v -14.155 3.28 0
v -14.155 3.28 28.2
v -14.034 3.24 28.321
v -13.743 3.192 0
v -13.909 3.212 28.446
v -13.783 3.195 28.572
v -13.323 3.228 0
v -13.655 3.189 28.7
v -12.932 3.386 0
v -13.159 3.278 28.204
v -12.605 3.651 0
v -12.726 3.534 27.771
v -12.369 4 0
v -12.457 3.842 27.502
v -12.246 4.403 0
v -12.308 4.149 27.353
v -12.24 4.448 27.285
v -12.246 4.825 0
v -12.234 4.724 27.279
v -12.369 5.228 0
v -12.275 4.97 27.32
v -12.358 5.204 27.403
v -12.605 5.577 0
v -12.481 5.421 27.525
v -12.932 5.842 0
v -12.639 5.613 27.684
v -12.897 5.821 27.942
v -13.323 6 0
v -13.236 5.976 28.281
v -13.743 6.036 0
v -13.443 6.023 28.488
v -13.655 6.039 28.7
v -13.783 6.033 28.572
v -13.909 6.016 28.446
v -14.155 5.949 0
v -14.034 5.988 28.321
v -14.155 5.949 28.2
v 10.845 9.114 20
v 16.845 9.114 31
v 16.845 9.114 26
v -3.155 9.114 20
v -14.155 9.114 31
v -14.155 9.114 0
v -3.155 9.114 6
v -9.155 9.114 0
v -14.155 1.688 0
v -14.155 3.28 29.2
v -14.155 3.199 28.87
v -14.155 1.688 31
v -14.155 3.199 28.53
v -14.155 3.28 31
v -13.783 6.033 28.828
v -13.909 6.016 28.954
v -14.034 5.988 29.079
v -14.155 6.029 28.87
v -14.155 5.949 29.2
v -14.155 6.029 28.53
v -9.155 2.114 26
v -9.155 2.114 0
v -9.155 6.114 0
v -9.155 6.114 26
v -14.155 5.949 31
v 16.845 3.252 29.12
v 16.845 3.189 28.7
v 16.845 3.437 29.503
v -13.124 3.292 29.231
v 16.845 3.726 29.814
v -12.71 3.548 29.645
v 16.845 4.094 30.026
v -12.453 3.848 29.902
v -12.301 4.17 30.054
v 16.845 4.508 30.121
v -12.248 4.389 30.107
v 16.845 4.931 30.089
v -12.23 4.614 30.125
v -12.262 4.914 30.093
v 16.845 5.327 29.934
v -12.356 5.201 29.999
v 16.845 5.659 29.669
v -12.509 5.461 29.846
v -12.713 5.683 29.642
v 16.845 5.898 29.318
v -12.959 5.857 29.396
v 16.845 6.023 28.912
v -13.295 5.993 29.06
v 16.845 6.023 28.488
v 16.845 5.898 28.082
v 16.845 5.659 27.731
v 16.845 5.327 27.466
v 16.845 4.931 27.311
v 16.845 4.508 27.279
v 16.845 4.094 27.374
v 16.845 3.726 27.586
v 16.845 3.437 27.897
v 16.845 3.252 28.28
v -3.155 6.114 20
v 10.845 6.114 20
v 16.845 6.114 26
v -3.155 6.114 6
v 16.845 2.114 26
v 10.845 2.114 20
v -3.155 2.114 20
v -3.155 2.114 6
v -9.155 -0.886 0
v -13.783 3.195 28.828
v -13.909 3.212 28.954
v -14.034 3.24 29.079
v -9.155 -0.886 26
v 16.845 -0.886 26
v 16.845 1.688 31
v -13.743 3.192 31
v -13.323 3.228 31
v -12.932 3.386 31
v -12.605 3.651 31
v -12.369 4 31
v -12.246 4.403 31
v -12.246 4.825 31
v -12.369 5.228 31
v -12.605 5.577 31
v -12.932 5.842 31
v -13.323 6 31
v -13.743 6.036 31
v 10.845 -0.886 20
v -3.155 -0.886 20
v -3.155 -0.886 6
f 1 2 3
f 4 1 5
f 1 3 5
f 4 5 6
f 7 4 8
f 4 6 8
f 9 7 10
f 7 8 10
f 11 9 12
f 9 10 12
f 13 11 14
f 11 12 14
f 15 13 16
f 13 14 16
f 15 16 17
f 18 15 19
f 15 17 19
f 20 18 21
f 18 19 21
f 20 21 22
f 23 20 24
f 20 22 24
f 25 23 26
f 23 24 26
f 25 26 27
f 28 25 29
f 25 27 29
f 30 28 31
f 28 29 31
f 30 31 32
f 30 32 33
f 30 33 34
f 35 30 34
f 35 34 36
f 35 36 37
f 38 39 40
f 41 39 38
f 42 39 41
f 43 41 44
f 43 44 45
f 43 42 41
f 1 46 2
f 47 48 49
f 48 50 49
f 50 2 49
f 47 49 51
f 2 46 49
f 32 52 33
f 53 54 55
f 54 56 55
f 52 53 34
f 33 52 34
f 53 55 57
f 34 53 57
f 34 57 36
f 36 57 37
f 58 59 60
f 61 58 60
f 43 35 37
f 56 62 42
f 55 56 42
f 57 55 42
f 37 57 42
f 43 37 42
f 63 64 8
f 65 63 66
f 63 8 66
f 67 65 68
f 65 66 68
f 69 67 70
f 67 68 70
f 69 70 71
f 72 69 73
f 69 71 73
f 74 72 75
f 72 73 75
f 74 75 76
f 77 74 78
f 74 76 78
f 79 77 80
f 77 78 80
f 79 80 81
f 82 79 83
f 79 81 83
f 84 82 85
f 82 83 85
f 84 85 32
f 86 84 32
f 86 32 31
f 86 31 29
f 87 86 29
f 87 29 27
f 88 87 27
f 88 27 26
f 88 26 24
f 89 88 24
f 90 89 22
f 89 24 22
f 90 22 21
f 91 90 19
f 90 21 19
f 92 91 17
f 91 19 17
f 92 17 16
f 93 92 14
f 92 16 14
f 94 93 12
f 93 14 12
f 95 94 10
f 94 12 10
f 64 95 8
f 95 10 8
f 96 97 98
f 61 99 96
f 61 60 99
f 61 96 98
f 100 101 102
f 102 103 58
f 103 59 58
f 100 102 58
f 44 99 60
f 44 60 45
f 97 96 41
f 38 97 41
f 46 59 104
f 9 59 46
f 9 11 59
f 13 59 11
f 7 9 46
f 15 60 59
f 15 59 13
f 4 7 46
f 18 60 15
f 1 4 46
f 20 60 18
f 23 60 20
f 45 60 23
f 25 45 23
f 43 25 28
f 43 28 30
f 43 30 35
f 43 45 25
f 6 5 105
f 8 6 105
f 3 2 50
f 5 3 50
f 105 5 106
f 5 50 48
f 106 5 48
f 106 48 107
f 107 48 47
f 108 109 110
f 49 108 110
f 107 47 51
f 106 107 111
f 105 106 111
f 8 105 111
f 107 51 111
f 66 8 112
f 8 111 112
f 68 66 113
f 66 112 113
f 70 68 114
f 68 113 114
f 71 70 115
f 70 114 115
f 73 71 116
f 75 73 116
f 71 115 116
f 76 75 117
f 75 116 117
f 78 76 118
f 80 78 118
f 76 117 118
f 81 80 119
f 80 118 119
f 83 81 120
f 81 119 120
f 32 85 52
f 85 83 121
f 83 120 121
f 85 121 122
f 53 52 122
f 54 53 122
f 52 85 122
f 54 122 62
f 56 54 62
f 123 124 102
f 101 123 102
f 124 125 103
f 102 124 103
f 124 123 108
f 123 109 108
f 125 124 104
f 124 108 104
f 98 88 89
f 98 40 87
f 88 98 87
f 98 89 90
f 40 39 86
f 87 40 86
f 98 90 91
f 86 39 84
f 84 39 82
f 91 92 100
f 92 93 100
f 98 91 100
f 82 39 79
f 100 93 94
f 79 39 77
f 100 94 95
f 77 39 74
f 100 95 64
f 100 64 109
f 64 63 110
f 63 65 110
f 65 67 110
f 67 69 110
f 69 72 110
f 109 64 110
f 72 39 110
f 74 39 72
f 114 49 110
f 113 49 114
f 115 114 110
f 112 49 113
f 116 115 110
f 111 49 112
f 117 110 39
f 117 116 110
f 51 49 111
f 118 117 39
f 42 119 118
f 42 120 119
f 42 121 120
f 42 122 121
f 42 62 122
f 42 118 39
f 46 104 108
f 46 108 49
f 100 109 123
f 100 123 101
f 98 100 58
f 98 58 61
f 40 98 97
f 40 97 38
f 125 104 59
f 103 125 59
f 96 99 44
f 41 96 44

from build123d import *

# Parameters (mm, degrees)
F1_DEPTH      = 20
F2_W          = 7
F2_H          = 20
F3_DEPTH      = 2
F5_DEPTH      = 6
F6_W          = 3
F6_H          = 6
F7_DEPTH      = 25
F8_DEPTH      = 3
F12_DEPTH     = 2
F13_DEPTH     = 11
F14_T4_DEPTH  = 29
F14_T10_DEPTH = 28
F14_T17_DEPTH = 38.2867319519
F14_T24_DEPTH = 39.2867319519
F15_T1_DEPTH  = 61.1449358039
F15_T3_DEPTH  = 60.1449358039
F16_DEPTH     = 1
F17_SIZE      = 6
F20_D         = 2.85
F20_ON_F18_D  = 2.85


# Not quite as in the source:
# - a fillet or chamfer that OpenCascade refuses, or shapes differently, is made with other operations: its cross-section is extruded or revolved along the edge and cut away or added


with BuildPart() as f1:
    # F0 (on Top) → F1 (new body)
    with BuildSketch(Plane.XY):
        Polygon((-3.1551690071, 9.1141472052), (-12.1551690071, 9.1141472052), (-12.1551690071, -0.8858527948), (-3.1551690071, -0.8858527948), (-3.1551690071, 2.1141472052), (-9.1551690071, 2.1141472052), (-9.1551690071, 6.1141472052), (-3.1551690071, 6.1141472052), align=None)
    extrude(amount=F1_DEPTH)

    # F2 (on face) → F3 (join)
    with BuildSketch(Plane(origin=(-12.1551690071, 0, 0), x_dir=(0, -1, 0), z_dir=(-1, 0, 0))):
        with Locations((-5.6141472052, 10)):
            Rectangle(F2_W, F2_H)
    extrude(amount=F3_DEPTH)

    # F4 (on face) → F5 (join)
    with BuildSketch(Plane.XY.offset(20)):
        Polygon((-12.1345976368, 9.1141472052), (-12.1551690071, 2.1141472052), (-12.1551690071, -0.8858527948), (-9.1551690071, -0.8858527948), (-9.1551690071, 2.1141472052), (-9.1551690071, 6.1141472052), (-9.1551690071, 9.1141472052), align=None)
    extrude(amount=F5_DEPTH)

    # F6 (on face) → F7 (join)
    with BuildSketch(Plane.YZ.offset(-9.1551690071)):
        with Locations((7.6141472052, 23)):
            Rectangle(F6_W, F6_H)
        with Locations((0.6141472052, 23)):
            Rectangle(F6_W, F6_H)
        Polygon((-0.8858527948, 26), (2.1141472052, 26), (6.1141472052, 26), (9.1141472052, 26), (9.1141472052, 29), (-0.8858527948, 29), align=None)
    extrude(amount=F7_DEPTH)

    # F8 (add): a face of the model
    f8_faces = [f1.faces().sort_by_distance(p)[0] for p in [
        (-10.6515768532, 4.1077318265, 26),
    ]]
    extrude(f8_faces, amount=F8_DEPTH)

    # F9: union 

    # F10: union 

    # F11 (on face) → F12 (join)
    with BuildSketch(Plane.XY.offset(29)):
        Polygon((-12.1345976368, 9.1141472052), (-12.1551690071, 2.1141472052), (15.8448309929, 2.1141472052), (15.8448309929, 9.1141472052), align=None)
    extrude(amount=F12_DEPTH)

    # F4 (on face) → F13 (join)
    with BuildSketch(Plane.XY.offset(20)):
        Polygon((-14.1551690071, 2.1141472052), (-12.1551690071, 2.1141472052), (-12.1345976368, 9.1141472052), (-14.1551690071, 9.1141472052), align=None)
    extrude(amount=F13_DEPTH)

    # F14: chamfer of 4 on 2 edges, made by hand


with BuildPart() as f14_tool2:
    # F14_s3 → F14_t4 (new body)
    with BuildSketch(Plane.XY):
        Polygon((-12.1551690071, -1.8858527948), (-16.1551690071, 2.1141472052), (-12.1551690071, 2.1141472052), align=None)
    extrude(amount=F14_T4_DEPTH)

    split(bisect_by=Plane.XZ.offset(0.8858527948), keep=Keep.BOTTOM)

    split(bisect_by=Plane.YZ.offset(-14.1551690071), keep=Keep.TOP)


with BuildPart() as f1_1:
    add(f1.part)

    # F14_t1: union F14_tool2
    add(f14_tool2.part)


with BuildPart() as f14_tool8:
    # F14_s9 → F14_t10 (new body)
    with BuildSketch(Plane.YZ.offset(-12.1551690071)):
        Polygon((-1.8858527948, 29), (2.1141472052, 33), (2.1141472052, 29), align=None)
    extrude(amount=F14_T10_DEPTH)

    split(bisect_by=Plane.XZ.offset(0.8858527948), keep=Keep.BOTTOM)

    split(bisect_by=Plane.XY.offset(31), keep=Keep.BOTTOM)


with BuildPart() as f1_2:
    add(f1_1.part)

    # F14_t7: union F14_tool8
    add(f14_tool8.part)


with BuildPart() as f14_tool15:
    # F14_s16 → F14_t17 (new body)
    with BuildSketch(Plane.YZ.offset(-22.4419009589)):
        Polygon((-1.8858527948, 29), (2.1141472052, 33), (2.1141472052, 29), align=None)
    extrude(amount=F14_T17_DEPTH)

    split(bisect_by=Plane.XZ.offset(0.8858527948), keep=Keep.BOTTOM)

    split(bisect_by=Plane.YZ.offset(-12.1551690071), keep=Keep.BOTTOM)

    split(bisect_by=Plane.YZ.offset(-14.1551690071), keep=Keep.TOP)

    split(bisect_by=Plane.XY.offset(31), keep=Keep.BOTTOM)


with BuildPart() as f14_tool22:
    # F14_s23 → F14_t24 (new body)
    with BuildSketch(Plane.XY):
        Polygon((-12.1551690071, -1.8858527948), (-16.1551690071, 2.1141472052), (-12.1551690071, 2.1141472052), align=None)
    extrude(amount=F14_T24_DEPTH)

    split(bisect_by=Plane.XZ.offset(0.8858527948), keep=Keep.BOTTOM)

    split(bisect_by=Plane.XY.offset(29), keep=Keep.TOP)

    split(bisect_by=Plane.YZ.offset(-14.1551690071), keep=Keep.TOP)

    split(bisect_by=Plane.XY.offset(31), keep=Keep.BOTTOM)


with BuildPart() as f14_tool15_1:
    add(f14_tool15.part)

    # F14_t29: intersect F14_tool22
    add(f14_tool22.part, mode=Mode.INTERSECT)


with BuildPart() as f1_3:
    add(f1_2.part)

    # F14_t13: union F14_tool15
    add(f14_tool15_1.part)

    # F15: chamfer of 4 x 6 on 2 edges, made by hand

    # F15_s2 → F15_t1 (cut)
    with BuildSketch(Plane.XY.offset(-15.5724679019)):
        Polygon((-9.1551690071, -0.8858527948), (-17.3978096942, 3.3567878923), (-13.1551690071, -0.8858527948), align=None)
    extrude(amount=F15_T1_DEPTH, mode=Mode.SUBTRACT)

    # F15_s4 → F15_t3 (cut)
    with BuildSketch(Plane.YZ.offset(-28.7276369091)):
        Polygon((-0.8858527948, 26), (3.3567878923, 34.2426406871), (-0.8858527948, 30), align=None)
    extrude(amount=F15_T3_DEPTH, mode=Mode.SUBTRACT)

    # F16 (add): a face of the model
    f16_faces = [f1_3.faces().sort_by_distance(p)[0] for p in [
        (15.8448309929, 6.2628078927, 23),
    ]]
    extrude(f16_faces, amount=F16_DEPTH)

    # F17
    f17_edges = [f1_3.edges().sort_by_distance(p)[0] for p in [
        (-3.155169, 0.614147, 0),
        (-3.155169, 7.614147, 0),
        (16.844831, 0.614147, 20),
        (16.844831, 7.614147, 20),
    ]]
    chamfer(f17_edges, length=F17_SIZE)

    # F20 (through all)
    with Locations(Plane(origin=(0, 0, 0), x_dir=(1, 0, 0), z_dir=(0, 0, -1))):
        with Locations((-13.6551690071, -4.6141472052)):
            Hole(F20_D / 2)

    # F20 on F18 (through all)
    with Locations(Plane.YZ.offset(16.8448309929)):
        with Locations((4.6141472052, 28.7)):
            Hole(F20_ON_F18_D / 2)


solid = f1_3.part
